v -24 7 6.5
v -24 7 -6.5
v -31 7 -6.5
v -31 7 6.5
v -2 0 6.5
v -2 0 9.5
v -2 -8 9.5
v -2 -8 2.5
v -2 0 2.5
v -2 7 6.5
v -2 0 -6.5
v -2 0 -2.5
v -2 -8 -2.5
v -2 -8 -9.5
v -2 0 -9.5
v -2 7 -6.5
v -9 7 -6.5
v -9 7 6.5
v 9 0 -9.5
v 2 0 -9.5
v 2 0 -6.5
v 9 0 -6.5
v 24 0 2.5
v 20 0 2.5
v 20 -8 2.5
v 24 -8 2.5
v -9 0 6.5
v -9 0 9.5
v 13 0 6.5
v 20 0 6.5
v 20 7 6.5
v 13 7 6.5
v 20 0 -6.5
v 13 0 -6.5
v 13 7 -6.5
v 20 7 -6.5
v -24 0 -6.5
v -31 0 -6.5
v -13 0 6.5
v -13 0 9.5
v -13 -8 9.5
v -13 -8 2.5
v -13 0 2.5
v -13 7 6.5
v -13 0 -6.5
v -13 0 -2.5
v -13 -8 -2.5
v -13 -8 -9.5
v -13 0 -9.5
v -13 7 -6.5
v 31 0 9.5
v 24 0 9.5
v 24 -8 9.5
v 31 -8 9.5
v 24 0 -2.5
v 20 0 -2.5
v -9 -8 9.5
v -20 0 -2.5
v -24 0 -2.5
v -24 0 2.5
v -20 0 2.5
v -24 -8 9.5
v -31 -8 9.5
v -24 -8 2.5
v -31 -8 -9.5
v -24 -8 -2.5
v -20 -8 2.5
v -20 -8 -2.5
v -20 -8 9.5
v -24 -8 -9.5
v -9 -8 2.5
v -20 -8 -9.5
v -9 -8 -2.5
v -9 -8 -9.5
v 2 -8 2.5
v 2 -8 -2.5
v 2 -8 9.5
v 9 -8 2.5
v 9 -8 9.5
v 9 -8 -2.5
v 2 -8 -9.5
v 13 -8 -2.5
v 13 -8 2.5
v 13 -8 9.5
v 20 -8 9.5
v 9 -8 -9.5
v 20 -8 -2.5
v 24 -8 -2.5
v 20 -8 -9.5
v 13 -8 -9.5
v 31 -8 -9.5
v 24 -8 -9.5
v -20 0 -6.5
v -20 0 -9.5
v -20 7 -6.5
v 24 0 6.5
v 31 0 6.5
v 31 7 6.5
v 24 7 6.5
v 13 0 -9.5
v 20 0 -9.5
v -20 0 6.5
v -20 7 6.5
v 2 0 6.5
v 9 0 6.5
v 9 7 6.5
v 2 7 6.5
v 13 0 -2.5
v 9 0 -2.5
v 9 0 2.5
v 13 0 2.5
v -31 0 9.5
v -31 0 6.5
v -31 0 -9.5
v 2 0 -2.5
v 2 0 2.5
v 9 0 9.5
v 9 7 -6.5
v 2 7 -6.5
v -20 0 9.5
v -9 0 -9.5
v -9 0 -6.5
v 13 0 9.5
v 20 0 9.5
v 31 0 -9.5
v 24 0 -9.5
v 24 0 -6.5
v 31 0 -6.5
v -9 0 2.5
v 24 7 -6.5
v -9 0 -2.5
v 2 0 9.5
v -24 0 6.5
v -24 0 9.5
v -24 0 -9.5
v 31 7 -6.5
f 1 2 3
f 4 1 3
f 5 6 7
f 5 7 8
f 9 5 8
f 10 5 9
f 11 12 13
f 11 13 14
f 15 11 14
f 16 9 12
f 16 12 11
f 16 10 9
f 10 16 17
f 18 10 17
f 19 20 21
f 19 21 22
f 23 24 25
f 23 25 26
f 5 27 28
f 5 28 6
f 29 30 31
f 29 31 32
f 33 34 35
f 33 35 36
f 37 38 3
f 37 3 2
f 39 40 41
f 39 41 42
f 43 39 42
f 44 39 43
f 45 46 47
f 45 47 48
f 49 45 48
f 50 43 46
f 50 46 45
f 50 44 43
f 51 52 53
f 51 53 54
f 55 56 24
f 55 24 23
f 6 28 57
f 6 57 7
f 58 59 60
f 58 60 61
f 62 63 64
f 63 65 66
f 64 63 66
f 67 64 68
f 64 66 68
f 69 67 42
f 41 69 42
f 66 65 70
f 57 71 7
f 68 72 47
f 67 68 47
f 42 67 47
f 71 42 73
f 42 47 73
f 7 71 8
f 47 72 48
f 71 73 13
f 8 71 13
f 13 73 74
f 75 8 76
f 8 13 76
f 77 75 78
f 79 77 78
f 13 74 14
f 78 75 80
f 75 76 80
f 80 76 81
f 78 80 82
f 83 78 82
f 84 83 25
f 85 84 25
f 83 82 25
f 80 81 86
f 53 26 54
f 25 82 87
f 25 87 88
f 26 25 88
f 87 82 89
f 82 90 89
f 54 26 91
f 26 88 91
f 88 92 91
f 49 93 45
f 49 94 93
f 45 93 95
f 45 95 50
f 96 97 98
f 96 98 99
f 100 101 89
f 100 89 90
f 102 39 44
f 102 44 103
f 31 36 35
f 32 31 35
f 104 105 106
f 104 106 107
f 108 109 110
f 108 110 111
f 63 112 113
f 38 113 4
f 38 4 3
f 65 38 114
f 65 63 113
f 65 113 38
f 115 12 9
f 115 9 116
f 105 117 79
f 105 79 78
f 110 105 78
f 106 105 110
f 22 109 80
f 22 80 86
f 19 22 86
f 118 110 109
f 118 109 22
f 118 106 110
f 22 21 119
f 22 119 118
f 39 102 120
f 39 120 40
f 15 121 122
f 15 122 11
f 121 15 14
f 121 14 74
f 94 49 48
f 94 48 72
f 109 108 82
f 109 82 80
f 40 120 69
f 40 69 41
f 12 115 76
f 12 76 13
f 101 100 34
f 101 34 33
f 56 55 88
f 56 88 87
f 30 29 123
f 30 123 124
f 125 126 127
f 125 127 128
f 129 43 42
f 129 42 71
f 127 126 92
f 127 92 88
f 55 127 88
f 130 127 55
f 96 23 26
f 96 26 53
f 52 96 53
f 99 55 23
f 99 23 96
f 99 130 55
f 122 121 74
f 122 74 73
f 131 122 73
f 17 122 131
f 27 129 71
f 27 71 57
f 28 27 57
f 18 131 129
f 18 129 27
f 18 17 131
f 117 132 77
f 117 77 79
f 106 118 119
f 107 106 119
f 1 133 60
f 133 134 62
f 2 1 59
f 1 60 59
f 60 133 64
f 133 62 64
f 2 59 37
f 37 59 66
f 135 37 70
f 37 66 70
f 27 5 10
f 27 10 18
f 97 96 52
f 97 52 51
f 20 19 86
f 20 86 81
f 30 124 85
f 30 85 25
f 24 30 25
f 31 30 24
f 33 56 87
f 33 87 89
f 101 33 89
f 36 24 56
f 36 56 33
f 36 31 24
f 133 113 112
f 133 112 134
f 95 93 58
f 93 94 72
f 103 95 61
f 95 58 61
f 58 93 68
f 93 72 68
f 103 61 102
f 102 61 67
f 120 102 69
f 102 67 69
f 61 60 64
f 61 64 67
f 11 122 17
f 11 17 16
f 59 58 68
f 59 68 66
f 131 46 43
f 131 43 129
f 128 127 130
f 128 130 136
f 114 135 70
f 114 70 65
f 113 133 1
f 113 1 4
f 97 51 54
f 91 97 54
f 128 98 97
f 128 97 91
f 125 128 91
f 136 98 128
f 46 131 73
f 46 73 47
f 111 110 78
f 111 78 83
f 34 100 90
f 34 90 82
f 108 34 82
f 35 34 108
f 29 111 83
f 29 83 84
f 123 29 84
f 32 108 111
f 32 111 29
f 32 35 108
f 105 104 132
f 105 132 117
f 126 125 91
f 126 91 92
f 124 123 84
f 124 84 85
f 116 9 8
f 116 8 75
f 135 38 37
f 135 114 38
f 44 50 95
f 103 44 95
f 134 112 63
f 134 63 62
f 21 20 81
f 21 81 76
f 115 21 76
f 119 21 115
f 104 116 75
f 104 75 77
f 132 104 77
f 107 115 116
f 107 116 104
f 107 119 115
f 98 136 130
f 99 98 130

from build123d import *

# Parameters (mm, degrees)
BOSS_EXTRUDE1_DEPTH = 8
BOSS_EXTRUDE2_DEPTH = 7


with BuildPart() as part:
    # Sketch1 → Boss-Extrude1 (new body)
    with BuildSketch(Plane(origin=(0, 0, 0), x_dir=(1, 0, 0), z_dir=(0, 1, 0))):
        Polygon((-13, 2.5), (-13, 9.5), (-20, 9.5), (-20, 2.5), (-24, 2.5), (-24, 9.5), (-31, 9.5), (-31, -9.5), (-24, -9.5), (-24, -2.5), (-20, -2.5), (-20, -9.5), (-13, -9.5), (-13, -2.5), (-9, -2.5), (-9, -9.5), (-2, -9.5), (-2, -2.5), (2, -2.5), (2, -9.5), (9, -9.5), (9, -2.5), (13, -2.5), (13, -9.5), (20, -9.5), (20, -2.5), (24, -2.5), (24, -9.5), (31, -9.5), (31, 9.5), (24, 9.5), (24, 2.5), (20, 2.5), (20, 9.5), (13, 9.5), (13, 2.5), (9, 2.5), (9, 9.5), (2, 9.5), (2, 2.5), (-2, 2.5), (-2, 9.5), (-9, 9.5), (-9, 2.5), align=None)
    extrude(amount=-BOSS_EXTRUDE1_DEPTH)

    # Sketch2 → Boss-Extrude2 (add)
    with BuildSketch(Plane(origin=(0, 0, 0), x_dir=(1, 0, 0), z_dir=(0, 1, 0))):
        Polygon((-31, 6.5), (-24, 6.5), (-24, 2.5), (-24, -2.5), (-24, -6.5), (-31, -6.5), align=None)
        Polygon((-20, 6.5), (-13, 6.5), (-13, 2.5), (-13, -2.5), (-13, -6.5), (-20, -6.5), (-20, -2.5), (-20, 2.5), align=None)
        Polygon((-9, 6.5), (-2, 6.5), (-2, 2.5), (-2, -2.5), (-2, -6.5), (-9, -6.5), (-9, -2.5), (-9, 2.5), align=None)
        Polygon((2, 6.5), (9, 6.5), (9, 2.5), (9, -2.5), (9, -6.5), (2, -6.5), (2, -2.5), (2, 2.5), align=None)
        Polygon((13, 6.5), (20, 6.5), (20, 2.5), (20, -2.5), (20, -6.5), (13, -6.5), (13, -2.5), (13, 2.5), align=None)
        Polygon((24, 6.5), (31, 6.5), (31, -6.5), (24, -6.5), (24, -2.5), (24, 2.5), align=None)
    extrude(amount=BOSS_EXTRUDE2_DEPTH)


solid = part.part
